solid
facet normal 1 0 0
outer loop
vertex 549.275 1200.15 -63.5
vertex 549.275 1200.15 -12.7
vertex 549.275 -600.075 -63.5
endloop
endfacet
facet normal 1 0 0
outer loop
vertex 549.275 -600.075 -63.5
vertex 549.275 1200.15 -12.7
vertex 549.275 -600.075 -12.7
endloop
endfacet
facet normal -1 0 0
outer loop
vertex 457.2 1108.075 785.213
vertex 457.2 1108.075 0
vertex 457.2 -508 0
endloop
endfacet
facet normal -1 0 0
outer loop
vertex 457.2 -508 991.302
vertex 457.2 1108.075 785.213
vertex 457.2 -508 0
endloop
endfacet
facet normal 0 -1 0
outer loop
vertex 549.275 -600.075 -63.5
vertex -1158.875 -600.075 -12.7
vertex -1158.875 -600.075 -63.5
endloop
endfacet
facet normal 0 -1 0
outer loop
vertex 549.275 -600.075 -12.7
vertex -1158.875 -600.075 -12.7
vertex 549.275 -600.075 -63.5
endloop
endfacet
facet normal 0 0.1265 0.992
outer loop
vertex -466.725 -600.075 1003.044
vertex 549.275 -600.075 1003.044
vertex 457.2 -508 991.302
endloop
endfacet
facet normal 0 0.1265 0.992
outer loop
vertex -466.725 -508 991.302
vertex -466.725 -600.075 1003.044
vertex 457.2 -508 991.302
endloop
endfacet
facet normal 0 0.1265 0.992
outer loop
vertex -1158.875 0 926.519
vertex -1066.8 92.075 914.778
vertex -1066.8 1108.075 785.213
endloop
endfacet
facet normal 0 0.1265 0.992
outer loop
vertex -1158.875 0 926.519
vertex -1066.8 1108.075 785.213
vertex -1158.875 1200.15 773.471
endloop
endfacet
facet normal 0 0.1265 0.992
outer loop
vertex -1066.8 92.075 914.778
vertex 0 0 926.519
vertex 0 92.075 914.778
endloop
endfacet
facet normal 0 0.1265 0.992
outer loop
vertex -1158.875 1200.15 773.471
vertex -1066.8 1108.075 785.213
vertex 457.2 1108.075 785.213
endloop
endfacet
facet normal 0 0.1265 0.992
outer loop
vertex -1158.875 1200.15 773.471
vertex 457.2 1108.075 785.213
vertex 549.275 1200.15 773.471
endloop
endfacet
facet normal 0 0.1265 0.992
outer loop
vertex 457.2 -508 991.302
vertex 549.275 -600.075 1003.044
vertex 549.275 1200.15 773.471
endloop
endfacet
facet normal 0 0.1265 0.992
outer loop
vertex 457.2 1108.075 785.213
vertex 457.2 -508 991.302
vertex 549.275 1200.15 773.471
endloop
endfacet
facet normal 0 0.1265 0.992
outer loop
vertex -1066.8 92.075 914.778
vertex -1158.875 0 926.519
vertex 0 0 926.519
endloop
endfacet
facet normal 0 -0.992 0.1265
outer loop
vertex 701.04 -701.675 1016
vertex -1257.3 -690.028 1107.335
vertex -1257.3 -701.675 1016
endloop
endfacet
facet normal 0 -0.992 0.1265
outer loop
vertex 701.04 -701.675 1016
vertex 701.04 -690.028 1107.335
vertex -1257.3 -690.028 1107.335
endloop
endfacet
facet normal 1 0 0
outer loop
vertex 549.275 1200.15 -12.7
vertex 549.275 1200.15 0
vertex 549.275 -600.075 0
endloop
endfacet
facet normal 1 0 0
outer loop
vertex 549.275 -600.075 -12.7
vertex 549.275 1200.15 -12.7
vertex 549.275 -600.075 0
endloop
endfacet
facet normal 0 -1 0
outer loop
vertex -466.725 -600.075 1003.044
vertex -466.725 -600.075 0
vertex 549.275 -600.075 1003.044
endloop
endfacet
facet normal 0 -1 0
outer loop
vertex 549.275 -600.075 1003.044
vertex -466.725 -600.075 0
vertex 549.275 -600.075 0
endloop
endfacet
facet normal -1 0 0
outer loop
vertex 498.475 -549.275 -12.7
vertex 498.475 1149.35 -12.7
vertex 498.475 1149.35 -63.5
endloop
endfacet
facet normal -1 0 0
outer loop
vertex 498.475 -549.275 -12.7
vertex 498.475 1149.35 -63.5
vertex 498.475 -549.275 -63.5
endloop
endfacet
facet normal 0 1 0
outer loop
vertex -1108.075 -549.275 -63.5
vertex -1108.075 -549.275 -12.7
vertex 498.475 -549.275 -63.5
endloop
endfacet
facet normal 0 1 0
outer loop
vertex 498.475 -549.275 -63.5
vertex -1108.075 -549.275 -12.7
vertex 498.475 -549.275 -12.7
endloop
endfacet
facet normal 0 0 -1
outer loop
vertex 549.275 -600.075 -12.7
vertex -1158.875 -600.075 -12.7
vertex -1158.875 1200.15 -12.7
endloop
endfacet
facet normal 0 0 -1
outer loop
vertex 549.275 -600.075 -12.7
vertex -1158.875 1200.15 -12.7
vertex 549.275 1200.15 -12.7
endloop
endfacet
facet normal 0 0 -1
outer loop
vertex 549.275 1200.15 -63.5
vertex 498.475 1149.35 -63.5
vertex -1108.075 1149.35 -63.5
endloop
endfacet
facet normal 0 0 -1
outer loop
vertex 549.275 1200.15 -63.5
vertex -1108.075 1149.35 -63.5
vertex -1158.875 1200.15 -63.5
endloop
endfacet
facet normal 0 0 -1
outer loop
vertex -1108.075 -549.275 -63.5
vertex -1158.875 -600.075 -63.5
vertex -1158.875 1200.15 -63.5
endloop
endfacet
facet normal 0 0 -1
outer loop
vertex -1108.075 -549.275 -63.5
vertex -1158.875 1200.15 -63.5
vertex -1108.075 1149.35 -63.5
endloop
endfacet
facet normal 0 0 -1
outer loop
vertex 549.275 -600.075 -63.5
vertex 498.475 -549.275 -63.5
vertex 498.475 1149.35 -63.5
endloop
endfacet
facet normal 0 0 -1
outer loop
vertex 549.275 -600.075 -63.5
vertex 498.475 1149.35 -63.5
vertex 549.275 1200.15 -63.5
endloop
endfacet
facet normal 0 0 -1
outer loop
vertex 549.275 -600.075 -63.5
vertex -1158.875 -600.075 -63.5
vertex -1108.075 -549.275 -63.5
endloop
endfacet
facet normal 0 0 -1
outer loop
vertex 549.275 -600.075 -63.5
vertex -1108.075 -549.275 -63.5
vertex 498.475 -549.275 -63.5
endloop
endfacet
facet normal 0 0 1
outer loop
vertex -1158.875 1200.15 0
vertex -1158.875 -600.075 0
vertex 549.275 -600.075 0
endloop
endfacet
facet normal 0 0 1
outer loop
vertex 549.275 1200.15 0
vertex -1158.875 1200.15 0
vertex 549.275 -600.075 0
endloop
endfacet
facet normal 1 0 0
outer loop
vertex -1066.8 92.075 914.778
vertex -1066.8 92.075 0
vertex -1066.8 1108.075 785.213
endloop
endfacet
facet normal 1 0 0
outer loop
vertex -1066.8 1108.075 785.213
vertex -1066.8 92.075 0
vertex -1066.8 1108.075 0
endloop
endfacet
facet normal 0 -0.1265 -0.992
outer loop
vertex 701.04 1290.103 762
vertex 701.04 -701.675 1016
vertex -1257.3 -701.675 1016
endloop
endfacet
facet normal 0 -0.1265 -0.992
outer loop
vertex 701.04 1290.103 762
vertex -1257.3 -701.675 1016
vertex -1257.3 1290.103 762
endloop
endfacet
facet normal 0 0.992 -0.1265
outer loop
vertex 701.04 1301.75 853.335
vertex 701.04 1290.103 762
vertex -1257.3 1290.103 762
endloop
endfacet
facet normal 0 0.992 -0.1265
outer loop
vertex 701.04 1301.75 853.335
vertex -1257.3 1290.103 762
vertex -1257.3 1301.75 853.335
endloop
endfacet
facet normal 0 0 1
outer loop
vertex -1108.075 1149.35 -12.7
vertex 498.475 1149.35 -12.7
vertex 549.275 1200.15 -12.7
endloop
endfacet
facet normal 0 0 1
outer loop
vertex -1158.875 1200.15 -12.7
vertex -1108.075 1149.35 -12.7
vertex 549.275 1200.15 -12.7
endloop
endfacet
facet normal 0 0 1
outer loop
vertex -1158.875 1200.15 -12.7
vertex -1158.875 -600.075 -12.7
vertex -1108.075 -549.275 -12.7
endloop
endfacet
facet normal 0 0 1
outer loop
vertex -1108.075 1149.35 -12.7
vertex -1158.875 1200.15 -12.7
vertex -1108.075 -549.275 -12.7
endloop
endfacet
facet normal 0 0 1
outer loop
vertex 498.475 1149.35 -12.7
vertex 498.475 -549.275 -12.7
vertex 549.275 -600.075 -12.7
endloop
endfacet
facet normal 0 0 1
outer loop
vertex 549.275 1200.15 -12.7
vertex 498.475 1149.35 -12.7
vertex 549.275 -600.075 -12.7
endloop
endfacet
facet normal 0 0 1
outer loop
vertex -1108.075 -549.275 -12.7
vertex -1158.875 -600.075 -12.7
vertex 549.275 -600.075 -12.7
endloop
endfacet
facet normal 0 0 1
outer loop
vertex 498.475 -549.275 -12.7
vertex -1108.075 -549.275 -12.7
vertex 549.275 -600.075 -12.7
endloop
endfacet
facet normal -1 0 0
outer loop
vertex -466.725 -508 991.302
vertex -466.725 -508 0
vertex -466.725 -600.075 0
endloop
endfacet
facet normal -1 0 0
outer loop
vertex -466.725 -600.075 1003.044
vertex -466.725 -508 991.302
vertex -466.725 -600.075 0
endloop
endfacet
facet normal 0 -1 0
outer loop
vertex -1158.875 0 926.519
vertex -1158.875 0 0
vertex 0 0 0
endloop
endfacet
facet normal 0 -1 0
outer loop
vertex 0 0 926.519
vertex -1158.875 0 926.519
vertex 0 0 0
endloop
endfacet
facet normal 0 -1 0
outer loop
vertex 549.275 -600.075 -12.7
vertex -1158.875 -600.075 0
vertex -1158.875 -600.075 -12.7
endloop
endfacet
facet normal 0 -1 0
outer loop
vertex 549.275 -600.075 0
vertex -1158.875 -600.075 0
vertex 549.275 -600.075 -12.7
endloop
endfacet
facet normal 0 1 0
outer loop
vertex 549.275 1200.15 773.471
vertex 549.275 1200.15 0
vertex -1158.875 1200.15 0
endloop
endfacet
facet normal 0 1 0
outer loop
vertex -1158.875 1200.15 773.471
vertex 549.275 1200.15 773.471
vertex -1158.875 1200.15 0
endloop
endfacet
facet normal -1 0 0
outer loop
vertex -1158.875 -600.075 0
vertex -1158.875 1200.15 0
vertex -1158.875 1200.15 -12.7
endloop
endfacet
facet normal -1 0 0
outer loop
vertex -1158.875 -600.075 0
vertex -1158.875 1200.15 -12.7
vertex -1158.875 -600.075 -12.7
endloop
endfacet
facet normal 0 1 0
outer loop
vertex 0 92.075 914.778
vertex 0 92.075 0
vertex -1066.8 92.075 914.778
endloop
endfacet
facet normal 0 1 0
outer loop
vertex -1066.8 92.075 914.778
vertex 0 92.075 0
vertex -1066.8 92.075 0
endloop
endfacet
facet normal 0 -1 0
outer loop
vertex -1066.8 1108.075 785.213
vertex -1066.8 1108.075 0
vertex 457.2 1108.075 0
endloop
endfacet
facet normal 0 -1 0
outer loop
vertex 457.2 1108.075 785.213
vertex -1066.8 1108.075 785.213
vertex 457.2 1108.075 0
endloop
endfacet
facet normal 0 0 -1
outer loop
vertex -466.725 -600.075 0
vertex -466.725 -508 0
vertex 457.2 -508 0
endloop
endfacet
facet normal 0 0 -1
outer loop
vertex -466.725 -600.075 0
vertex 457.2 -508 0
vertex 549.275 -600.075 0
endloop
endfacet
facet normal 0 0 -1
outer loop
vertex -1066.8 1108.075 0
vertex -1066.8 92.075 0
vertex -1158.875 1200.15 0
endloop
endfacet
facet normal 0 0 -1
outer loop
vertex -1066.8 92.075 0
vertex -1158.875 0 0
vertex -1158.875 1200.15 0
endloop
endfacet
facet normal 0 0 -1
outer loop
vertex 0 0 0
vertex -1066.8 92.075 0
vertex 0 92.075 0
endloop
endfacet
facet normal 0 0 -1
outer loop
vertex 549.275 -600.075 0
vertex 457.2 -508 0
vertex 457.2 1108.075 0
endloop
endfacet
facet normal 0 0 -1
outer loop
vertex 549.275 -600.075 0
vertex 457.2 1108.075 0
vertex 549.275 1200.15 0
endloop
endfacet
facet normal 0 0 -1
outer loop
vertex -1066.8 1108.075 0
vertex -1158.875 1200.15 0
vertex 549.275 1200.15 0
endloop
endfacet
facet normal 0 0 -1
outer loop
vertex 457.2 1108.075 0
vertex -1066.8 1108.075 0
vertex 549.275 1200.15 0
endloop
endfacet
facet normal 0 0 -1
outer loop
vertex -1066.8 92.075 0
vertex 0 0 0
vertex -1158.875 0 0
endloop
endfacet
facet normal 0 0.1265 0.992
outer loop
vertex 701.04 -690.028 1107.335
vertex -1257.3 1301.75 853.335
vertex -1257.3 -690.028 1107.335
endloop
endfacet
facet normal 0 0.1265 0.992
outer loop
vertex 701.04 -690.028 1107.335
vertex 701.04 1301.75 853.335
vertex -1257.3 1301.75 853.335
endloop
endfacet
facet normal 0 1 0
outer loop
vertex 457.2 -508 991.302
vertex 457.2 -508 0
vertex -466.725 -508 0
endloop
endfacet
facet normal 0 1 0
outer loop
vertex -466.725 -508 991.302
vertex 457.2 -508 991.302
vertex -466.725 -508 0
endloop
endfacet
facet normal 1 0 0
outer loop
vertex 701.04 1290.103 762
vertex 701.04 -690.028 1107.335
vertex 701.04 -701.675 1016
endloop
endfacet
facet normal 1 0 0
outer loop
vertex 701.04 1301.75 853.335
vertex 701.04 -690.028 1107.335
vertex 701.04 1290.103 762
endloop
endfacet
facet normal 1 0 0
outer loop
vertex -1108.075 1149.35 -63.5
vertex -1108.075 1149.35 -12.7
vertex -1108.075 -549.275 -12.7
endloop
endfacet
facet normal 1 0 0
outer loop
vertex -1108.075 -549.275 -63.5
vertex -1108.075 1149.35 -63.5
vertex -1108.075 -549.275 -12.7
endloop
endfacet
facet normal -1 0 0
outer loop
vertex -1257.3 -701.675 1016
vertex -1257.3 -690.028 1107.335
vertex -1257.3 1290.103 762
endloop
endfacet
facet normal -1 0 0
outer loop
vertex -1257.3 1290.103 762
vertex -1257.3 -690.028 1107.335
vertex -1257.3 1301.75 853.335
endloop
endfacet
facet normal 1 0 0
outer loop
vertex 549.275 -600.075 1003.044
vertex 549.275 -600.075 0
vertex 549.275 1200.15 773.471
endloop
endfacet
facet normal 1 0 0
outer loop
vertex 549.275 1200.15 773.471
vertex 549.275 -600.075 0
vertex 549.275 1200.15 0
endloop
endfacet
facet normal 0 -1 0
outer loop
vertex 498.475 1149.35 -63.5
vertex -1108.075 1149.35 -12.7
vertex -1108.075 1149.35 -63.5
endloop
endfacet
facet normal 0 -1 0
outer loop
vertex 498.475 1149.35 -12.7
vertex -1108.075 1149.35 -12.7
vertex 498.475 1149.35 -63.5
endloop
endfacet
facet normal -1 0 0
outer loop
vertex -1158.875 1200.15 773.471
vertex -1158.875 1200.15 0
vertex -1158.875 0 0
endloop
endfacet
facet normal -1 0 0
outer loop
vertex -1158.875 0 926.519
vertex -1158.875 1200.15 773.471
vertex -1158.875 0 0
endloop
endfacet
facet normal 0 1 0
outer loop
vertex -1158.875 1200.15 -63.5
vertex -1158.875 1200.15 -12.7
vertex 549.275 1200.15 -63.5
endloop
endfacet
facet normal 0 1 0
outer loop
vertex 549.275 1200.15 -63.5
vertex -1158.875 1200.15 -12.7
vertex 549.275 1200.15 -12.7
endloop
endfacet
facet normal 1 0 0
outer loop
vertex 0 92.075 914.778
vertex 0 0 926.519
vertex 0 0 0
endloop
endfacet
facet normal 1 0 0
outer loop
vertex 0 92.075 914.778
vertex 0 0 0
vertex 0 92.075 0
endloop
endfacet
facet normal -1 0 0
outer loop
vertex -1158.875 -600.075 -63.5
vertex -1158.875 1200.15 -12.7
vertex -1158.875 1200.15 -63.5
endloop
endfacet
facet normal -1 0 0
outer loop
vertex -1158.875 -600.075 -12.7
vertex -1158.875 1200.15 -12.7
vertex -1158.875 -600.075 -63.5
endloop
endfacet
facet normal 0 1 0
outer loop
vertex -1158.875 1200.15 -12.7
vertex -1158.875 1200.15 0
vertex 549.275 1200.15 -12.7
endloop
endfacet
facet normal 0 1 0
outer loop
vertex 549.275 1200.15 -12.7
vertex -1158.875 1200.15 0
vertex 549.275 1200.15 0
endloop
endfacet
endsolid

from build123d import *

# Parameters (mm, degrees)
F2_DEPTH      = 701.04
F2_DEPTH_BACK = 1257.3
F4_W          = 1708.15
F4_H          = 1800.225
F5_DEPTH      = 12.7
F6_W          = 1708.15
F6_H          = 1800.225
F6_W_2        = 1606.55
F6_H_2        = 1698.625
F7_DEPTH      = 50.8


with BuildPart() as f2:
    # F1 (on Right) → F2 (new body, two sides)
    with BuildSketch(Plane.YZ) as f2_sk:
        Polygon((-690.0275279216, 1107.3353273339), (-701.675, 1016), (1290.1025279216, 762), (1301.75, 853.3353273339), align=None)
    extrude(amount=F2_DEPTH)
    extrude(f2_sk.sketch, amount=-F2_DEPTH_BACK)


with BuildPart() as f3:
    # F0 (on Top) → F3 (new body, up to the next surface of F2)
    with BuildSketch(Plane.XY):
        Polygon((549.275, -600.075), (549.275, 1200.15), (-1158.875, 1200.15), (-1158.875, 0), (0, 0), (0, 92.075), (-1066.8, 92.075), (-1066.8, 1108.075), (457.2, 1108.075), (457.2, -508), (-466.725, -508), (-466.725, -600.075), align=None)
    extrude(until=Until.NEXT, target=f2.part)


with BuildPart() as f5:
    # F4 (on face) → F5 (new body)
    with BuildSketch(Plane(origin=(0, 0, 0), x_dir=(1, 0, 0), z_dir=(0, 0, -1))):
        with Locations((-304.8, -300.0375)):
            Rectangle(F4_W, F4_H)
    extrude(amount=F5_DEPTH)


with BuildPart() as f7:
    # F6 (on face) → F7 (new body)
    with BuildSketch(Plane(origin=(0, 0, -12.7), x_dir=(1, 0, 0), z_dir=(0, 0, -1))):
        with Locations((-304.8, -300.0375)):
            Rectangle(F6_W, F6_H)
        with Locations((-304.8, -300.0375)):
            Rectangle(F6_W_2, F6_H_2, mode=Mode.SUBTRACT)
    extrude(amount=F7_DEPTH)


solid = Compound([f2.part, f3.part, f5.part, f7.part])
